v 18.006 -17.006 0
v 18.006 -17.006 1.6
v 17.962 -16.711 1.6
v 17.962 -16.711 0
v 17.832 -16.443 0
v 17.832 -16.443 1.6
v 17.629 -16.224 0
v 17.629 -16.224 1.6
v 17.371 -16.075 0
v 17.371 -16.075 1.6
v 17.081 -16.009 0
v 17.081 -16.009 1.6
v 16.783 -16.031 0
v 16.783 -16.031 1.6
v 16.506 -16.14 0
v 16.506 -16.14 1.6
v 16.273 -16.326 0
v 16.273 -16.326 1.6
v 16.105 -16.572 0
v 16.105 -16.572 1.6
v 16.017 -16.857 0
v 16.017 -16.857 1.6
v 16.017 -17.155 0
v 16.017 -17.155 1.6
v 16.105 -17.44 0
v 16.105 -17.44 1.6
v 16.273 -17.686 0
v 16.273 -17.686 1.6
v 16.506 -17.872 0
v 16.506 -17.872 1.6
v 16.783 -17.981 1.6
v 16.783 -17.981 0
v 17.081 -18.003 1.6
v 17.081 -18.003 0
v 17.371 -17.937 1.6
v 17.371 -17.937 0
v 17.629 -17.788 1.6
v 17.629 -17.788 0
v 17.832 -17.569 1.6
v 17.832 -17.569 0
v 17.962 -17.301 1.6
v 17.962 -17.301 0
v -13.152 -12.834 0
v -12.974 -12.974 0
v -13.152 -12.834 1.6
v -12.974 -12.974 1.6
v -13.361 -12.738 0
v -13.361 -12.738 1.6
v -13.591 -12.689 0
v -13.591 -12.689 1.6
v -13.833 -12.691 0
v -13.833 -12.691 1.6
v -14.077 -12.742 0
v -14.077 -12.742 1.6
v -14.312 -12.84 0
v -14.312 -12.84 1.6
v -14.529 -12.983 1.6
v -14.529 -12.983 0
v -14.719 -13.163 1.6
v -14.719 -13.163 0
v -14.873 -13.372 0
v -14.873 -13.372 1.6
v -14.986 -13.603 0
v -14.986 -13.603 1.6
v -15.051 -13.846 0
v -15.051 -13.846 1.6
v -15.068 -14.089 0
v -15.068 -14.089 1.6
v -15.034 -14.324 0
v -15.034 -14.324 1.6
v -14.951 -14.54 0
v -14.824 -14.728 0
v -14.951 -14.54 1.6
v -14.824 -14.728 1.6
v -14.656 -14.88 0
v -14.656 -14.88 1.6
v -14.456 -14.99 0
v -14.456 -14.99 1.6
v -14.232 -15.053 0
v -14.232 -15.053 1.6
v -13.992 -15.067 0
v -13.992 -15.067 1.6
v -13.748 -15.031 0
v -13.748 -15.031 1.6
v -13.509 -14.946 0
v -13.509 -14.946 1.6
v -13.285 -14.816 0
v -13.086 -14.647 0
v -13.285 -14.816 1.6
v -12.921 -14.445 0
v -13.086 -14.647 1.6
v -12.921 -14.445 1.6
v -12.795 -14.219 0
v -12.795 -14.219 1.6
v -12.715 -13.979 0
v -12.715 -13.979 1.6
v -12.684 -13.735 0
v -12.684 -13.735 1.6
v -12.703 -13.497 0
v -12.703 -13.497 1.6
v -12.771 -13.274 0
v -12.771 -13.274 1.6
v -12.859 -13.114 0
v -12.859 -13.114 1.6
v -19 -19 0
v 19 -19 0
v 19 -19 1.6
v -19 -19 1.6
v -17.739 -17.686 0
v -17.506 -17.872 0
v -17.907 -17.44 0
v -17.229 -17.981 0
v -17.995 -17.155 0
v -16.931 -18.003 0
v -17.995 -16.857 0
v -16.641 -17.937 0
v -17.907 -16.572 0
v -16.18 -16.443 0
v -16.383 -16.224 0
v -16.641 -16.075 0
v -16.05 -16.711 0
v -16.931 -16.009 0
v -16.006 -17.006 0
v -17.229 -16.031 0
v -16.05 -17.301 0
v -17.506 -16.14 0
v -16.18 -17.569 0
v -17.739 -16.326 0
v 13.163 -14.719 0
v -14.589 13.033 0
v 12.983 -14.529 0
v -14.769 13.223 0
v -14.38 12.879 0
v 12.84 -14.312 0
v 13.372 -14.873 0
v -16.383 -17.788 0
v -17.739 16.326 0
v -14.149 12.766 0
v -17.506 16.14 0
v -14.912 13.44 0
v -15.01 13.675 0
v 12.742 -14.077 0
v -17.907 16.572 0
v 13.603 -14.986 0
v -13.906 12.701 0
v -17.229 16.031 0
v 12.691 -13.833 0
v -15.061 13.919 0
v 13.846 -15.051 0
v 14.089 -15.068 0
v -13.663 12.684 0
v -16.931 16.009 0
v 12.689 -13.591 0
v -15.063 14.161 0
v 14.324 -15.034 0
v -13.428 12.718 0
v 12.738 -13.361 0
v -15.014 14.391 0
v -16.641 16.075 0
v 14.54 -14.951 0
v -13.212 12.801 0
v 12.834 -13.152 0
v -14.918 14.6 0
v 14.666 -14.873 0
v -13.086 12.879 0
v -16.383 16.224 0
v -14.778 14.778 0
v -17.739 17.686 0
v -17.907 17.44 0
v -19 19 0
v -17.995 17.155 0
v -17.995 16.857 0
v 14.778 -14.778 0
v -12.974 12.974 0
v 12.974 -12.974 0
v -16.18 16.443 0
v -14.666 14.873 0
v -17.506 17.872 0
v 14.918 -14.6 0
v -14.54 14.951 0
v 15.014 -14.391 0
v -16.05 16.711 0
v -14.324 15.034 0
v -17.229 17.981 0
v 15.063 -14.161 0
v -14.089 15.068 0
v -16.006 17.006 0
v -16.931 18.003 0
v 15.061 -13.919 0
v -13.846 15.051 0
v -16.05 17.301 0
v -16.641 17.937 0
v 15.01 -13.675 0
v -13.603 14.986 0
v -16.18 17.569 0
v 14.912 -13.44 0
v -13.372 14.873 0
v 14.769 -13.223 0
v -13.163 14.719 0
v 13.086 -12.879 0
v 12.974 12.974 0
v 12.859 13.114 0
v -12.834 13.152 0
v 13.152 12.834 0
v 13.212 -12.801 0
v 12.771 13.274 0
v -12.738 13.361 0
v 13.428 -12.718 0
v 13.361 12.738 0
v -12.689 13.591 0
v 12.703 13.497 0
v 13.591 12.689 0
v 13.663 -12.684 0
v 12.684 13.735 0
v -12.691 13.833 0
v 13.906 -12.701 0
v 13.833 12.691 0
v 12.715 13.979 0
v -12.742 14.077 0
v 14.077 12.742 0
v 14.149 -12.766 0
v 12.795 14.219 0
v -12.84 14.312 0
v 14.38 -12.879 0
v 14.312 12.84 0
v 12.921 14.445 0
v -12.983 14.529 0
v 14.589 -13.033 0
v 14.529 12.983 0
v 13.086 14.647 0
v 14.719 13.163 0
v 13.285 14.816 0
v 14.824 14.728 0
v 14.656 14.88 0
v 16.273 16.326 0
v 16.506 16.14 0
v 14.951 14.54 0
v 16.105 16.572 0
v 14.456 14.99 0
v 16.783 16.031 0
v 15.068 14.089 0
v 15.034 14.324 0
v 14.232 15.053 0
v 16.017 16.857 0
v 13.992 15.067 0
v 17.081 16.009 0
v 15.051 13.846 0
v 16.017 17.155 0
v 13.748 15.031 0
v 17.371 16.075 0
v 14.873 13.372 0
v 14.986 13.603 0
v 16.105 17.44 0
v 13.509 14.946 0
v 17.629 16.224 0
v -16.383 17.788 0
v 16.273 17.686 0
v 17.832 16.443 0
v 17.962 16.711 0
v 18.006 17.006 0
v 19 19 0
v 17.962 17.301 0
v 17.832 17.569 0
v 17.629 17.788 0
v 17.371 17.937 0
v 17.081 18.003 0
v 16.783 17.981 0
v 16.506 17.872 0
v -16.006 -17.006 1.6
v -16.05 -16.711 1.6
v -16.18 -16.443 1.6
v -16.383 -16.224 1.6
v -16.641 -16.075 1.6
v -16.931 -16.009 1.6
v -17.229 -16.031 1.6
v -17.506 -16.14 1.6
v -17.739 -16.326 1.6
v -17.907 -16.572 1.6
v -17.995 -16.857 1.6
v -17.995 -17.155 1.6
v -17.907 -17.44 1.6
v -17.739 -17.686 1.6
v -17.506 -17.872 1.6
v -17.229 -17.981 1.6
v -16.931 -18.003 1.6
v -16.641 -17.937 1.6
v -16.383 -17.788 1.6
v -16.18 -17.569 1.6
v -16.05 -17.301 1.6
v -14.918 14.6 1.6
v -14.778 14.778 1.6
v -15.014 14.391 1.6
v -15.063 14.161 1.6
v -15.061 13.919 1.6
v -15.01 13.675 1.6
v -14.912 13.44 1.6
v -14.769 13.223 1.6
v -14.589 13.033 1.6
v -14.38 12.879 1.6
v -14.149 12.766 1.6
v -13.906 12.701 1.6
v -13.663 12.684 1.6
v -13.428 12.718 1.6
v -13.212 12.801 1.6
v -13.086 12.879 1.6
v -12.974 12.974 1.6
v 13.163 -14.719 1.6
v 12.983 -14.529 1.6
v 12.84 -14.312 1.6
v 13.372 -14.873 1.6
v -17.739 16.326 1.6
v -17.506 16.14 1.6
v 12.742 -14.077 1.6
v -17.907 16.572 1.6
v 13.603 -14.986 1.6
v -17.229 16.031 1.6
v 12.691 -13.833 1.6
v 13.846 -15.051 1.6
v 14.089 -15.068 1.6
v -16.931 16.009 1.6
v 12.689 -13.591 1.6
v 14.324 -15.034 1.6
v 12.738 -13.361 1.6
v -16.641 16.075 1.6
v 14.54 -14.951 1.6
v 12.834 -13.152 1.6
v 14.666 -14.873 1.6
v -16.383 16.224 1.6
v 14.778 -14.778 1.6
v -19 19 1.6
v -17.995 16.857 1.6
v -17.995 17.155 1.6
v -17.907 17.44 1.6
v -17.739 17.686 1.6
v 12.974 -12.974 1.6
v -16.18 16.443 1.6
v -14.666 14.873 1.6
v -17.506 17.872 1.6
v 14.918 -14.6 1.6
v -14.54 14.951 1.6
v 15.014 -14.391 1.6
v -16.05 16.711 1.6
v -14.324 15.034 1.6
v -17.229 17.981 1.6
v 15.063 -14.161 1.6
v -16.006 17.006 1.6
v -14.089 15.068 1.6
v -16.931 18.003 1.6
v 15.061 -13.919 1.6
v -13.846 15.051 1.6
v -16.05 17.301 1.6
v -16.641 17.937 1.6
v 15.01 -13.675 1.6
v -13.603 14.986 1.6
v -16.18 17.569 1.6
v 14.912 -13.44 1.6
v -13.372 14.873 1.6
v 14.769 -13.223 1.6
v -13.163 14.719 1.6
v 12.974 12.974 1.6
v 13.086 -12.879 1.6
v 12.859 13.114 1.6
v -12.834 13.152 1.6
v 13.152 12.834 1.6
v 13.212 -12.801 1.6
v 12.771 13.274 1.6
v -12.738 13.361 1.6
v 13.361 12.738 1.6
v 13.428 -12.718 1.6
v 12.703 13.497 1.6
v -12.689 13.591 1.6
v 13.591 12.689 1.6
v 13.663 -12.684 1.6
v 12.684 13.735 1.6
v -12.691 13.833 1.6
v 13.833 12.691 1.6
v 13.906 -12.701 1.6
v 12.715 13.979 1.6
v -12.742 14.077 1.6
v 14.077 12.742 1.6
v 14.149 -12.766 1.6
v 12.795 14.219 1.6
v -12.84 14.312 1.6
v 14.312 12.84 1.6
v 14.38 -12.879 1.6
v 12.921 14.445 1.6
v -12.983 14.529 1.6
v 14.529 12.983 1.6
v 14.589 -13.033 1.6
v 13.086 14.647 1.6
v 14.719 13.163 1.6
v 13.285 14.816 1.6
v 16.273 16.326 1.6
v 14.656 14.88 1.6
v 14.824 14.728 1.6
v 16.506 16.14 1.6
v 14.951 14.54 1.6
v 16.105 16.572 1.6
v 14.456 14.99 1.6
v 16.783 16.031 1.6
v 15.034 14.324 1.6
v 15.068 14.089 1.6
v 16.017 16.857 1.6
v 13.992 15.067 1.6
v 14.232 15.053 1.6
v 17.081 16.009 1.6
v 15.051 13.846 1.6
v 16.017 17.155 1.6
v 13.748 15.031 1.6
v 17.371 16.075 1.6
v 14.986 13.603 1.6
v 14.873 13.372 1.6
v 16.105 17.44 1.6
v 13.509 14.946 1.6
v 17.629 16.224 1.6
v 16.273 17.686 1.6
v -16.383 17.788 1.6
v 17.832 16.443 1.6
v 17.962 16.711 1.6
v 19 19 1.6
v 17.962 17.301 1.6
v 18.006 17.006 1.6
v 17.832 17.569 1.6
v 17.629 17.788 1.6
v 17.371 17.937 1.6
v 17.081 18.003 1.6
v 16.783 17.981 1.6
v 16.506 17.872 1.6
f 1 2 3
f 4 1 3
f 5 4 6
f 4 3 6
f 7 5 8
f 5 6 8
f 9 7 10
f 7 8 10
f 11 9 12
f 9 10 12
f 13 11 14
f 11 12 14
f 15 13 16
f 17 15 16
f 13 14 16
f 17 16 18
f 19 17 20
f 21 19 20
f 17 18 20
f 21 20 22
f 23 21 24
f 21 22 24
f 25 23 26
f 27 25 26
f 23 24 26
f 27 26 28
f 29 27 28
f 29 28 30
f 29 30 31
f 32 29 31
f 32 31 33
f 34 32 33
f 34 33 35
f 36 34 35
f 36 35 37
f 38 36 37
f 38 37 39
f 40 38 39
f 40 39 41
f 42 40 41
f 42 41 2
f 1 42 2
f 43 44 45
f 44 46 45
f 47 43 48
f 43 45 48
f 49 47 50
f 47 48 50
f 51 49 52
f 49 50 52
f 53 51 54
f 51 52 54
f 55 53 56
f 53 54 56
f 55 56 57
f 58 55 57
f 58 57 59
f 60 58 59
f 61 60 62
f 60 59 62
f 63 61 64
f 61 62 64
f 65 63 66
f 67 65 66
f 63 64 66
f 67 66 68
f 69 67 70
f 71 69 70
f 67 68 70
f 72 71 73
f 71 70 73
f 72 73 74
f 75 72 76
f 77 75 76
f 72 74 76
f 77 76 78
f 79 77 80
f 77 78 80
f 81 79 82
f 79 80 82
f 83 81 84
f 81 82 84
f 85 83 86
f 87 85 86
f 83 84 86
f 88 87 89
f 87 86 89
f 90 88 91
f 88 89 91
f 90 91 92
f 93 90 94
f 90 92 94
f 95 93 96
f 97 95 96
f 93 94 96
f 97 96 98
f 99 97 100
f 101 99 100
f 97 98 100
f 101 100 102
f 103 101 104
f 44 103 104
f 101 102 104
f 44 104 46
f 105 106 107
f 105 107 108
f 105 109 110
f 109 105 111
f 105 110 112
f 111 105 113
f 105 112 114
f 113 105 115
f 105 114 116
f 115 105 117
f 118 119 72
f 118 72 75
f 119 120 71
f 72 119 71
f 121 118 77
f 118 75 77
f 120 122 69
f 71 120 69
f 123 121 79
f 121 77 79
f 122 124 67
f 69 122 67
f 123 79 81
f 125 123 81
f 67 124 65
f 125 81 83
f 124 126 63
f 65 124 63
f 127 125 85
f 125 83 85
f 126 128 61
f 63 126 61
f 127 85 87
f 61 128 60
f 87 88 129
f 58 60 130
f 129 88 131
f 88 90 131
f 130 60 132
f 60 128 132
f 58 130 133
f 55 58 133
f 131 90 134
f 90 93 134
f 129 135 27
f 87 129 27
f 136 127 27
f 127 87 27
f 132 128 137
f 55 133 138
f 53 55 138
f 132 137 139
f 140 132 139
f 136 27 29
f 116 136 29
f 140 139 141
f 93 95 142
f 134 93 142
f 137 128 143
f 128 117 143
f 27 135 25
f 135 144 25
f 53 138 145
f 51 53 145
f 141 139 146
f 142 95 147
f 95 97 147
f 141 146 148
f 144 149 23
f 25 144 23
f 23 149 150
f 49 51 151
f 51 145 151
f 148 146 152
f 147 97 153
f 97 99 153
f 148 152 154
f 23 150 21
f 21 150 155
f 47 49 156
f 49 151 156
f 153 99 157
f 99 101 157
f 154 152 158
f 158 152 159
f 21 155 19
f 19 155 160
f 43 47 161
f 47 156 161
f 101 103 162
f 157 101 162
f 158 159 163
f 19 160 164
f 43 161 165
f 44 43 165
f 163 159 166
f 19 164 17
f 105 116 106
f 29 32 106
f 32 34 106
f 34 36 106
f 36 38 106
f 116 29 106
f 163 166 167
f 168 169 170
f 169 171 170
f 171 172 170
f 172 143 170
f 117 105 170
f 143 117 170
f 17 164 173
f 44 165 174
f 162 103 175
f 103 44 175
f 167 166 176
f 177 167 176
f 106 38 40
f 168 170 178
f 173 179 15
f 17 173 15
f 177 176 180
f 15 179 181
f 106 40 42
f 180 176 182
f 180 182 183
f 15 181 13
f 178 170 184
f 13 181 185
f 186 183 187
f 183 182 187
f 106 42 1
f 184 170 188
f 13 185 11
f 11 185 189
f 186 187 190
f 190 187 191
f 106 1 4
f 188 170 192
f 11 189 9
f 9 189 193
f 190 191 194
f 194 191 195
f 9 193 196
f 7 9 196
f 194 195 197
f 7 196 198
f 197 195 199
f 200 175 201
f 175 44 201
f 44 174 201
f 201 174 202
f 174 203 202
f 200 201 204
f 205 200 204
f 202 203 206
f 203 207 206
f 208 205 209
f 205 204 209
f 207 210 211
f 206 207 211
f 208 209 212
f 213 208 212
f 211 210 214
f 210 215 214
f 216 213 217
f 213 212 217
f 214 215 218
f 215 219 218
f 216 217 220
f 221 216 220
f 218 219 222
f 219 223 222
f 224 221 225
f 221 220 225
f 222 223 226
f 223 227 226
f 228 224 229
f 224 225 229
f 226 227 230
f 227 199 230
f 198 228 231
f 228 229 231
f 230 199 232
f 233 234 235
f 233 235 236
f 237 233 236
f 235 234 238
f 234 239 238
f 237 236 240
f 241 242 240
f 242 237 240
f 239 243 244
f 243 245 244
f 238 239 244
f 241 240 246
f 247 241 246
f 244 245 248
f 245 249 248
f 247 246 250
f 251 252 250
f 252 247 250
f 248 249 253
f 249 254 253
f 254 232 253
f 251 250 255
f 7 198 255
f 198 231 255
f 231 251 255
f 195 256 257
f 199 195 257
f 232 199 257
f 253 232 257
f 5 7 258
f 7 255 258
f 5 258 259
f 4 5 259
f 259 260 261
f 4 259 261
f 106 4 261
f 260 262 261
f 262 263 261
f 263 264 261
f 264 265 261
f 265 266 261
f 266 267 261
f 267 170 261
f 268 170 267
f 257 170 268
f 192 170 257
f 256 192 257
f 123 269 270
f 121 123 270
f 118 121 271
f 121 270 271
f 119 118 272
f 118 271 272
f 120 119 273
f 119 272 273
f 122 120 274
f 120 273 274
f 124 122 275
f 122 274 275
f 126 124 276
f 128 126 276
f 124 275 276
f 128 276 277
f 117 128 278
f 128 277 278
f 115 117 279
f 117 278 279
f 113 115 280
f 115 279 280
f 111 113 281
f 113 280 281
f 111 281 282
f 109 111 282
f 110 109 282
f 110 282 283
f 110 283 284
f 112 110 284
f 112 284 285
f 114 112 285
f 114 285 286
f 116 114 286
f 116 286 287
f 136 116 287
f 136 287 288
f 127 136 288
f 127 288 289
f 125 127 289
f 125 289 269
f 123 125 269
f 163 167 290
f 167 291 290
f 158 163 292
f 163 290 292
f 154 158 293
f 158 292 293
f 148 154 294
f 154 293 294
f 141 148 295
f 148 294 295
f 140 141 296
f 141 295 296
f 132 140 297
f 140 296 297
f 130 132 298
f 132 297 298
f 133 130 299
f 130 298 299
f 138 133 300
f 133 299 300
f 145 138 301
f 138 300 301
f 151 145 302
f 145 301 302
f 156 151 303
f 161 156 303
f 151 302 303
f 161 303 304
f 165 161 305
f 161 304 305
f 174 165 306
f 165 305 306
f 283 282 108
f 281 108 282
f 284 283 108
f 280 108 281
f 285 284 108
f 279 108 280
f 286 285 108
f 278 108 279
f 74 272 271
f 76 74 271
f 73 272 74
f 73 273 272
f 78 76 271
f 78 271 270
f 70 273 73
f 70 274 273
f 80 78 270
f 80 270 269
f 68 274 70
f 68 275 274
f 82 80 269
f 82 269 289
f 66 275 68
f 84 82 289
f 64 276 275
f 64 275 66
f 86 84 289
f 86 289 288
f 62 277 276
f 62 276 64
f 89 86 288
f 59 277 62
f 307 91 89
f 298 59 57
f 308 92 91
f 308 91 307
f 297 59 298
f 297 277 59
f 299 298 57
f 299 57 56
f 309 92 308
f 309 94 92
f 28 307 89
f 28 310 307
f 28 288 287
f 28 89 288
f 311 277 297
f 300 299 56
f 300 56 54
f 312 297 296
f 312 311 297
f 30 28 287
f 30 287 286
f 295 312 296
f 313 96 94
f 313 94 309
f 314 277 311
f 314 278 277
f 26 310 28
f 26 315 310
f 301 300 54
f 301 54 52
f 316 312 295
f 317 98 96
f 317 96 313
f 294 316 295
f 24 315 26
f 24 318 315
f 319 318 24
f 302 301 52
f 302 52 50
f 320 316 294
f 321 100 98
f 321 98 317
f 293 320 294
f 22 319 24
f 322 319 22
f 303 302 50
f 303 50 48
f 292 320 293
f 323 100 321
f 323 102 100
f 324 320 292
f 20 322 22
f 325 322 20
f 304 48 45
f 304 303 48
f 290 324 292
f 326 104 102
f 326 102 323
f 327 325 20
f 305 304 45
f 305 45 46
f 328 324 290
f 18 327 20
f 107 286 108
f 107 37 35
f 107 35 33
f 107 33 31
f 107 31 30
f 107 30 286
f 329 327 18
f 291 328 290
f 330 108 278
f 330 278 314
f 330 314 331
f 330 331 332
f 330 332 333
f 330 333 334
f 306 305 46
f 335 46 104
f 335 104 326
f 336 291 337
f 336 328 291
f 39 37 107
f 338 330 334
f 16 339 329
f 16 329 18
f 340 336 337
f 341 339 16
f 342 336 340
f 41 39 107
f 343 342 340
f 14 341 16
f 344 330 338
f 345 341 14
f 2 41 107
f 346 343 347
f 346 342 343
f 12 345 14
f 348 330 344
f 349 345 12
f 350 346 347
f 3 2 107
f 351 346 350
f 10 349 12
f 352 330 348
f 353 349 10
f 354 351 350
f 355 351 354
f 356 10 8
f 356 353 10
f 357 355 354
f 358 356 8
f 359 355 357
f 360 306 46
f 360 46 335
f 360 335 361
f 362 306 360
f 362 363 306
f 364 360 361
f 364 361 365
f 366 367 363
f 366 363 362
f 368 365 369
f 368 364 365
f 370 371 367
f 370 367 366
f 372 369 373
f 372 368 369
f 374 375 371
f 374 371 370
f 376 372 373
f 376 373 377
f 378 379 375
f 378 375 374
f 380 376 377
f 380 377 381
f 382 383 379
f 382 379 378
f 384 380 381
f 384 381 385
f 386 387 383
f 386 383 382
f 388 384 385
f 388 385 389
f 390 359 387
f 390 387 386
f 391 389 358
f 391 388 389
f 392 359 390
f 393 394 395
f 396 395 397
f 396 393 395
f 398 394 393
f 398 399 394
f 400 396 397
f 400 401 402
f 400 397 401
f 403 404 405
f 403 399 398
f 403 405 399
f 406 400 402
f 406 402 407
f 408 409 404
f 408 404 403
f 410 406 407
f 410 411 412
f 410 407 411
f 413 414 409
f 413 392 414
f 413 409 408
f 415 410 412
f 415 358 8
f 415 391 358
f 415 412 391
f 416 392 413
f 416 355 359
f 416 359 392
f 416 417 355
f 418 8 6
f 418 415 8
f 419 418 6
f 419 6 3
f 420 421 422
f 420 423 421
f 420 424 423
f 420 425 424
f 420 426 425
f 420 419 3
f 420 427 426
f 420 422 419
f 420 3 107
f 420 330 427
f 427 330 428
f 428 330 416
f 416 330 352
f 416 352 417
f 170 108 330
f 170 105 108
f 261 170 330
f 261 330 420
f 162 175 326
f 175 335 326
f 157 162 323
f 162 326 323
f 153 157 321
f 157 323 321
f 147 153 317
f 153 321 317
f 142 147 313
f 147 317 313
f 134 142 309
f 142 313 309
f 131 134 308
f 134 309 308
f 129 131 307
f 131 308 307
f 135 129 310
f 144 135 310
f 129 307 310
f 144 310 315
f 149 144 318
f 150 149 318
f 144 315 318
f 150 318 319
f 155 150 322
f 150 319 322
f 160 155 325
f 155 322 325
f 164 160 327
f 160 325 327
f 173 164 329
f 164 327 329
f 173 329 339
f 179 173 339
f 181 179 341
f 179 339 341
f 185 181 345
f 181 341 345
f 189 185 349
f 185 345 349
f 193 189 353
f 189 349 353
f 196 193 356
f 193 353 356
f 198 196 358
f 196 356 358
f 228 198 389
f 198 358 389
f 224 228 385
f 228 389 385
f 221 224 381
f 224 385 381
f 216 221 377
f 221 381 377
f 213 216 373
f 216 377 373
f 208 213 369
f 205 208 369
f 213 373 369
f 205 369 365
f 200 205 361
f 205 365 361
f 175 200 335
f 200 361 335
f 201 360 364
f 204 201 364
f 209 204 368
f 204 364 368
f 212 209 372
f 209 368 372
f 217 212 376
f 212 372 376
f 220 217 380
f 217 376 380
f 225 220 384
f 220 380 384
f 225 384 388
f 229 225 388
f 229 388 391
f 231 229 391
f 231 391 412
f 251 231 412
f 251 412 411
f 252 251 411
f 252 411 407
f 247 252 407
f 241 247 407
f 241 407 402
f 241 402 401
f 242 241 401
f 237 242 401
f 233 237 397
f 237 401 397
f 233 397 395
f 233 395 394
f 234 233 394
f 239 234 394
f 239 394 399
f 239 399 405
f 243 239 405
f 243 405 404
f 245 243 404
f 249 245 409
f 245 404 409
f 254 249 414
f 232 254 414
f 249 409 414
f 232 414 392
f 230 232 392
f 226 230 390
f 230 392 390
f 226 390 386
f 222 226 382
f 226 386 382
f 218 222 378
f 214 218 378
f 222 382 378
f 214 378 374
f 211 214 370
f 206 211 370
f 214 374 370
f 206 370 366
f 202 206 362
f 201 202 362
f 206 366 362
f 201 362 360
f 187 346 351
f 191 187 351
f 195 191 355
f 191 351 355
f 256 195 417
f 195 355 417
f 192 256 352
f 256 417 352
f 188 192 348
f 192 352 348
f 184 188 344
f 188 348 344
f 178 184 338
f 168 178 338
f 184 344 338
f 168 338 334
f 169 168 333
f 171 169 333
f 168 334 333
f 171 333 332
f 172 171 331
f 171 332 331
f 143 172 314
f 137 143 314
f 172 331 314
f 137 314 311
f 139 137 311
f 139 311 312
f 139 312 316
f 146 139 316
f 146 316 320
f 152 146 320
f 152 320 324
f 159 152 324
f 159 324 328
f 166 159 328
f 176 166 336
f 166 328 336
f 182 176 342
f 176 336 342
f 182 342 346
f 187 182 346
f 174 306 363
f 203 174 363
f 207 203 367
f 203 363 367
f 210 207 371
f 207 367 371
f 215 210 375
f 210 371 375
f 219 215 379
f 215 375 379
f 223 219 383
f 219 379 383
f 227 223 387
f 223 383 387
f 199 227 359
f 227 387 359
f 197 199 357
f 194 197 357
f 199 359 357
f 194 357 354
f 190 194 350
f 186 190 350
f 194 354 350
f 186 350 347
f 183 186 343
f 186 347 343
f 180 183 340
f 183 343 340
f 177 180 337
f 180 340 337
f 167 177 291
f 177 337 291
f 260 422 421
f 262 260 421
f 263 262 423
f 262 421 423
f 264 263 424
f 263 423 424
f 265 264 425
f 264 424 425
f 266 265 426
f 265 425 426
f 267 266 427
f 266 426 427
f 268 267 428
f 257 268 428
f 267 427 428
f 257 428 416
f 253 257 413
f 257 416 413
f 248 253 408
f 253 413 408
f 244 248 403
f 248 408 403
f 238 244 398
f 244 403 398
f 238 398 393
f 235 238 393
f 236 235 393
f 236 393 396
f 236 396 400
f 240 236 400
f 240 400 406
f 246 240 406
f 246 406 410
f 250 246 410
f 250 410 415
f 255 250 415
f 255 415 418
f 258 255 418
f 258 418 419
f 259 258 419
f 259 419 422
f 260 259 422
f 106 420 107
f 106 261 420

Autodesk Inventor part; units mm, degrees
ref_plane "YZ Plane" through (0, 0, 0) normal (1, 0, 0) x (0, 1, 0)
ref_plane "XZ Plane" through (0, 0, 0) normal (0, 1, 0) x (-1, 0, 0)
ref_plane "XY Plane" through (0, 0, 0) normal (0, 0, 1) x (1, 0, 0)
sketch "Sketch1" plane through (0, 0, 0) normal (0, 0, 1) x (1, 0, 0)
  line L0 (-19, 19) -> (19, 19)
  line L1 (19, 19) -> (19, -19)
  line L2 (19, -19) -> (-19, -19)
  line L3 (-19, -19) -> (-19, 19)
  point P0 (0, 0)
  point P1 (0, 19)
  point P2 (-19, 0)
  dimension "d0" = 38
  dimension "d1" = 38
extrude "Extrusion1" add sketch "Sketch1" along normal blind 1.6
sketch "Sketch2" plane through (0, 0, 1.6) normal (0, 0, 1) x (1, 0, 0)
  circle A0 centre (-17.006, 17.006) radius 1
  line L0 (19, 19) -> (-19, 19) projected
  line L1 (-19, 19) -> (-19, -19) projected
  line L2 (19, -19) -> (19, 19) projected
  line L3 (-19, -19) -> (19, -19) projected
  ellipse E0 centre (-13.876, 13.876) end of major axis (-12.9744, 12.9744) minor radius 1.1035
  line L4 (-19, 19) -> (19, -19)
  line L5 (0, 19) -> (0, -19)
  ellipse E1 centre (13.876, 13.876) end of major axis (12.9744, 12.9744) minor radius 1.1035
  line L6 (-19, 0) -> (19, 0)
  ellipse E2 centre (-13.876, -13.876) end of major axis (-12.9744, -12.9744) minor radius 1.1035
  ellipse E3 centre (13.876, -13.876) end of major axis (12.9744, -12.9744) minor radius 1.1035
  circle A1 centre (17.006, 17.006) radius 1
  circle A2 centre (-17.006, -17.006) radius 1
  circle A3 centre (17.006, -17.006) radius 1
  point P0 (0, 0)
  dimension "d52" = 1.1035
  dimension "d53" = 1.275
  dimension "d4" = 2
  dimension "d54" = 13.876
  dimension "d60" = 13.876
  dimension "d61" = 17.006
  dimension "d62" = 17.006
extrude "Extrusion3" cut sketch "Sketch2" against normal blind 1.6 contours A0 L4 | L4 A0 | L4 E0 | E0 L4 | E3 L4 | L4 E3 | A3 L4 | L4 A3 | E1 | E2 | A1 | A2
properties part number "PCB_Camera"
